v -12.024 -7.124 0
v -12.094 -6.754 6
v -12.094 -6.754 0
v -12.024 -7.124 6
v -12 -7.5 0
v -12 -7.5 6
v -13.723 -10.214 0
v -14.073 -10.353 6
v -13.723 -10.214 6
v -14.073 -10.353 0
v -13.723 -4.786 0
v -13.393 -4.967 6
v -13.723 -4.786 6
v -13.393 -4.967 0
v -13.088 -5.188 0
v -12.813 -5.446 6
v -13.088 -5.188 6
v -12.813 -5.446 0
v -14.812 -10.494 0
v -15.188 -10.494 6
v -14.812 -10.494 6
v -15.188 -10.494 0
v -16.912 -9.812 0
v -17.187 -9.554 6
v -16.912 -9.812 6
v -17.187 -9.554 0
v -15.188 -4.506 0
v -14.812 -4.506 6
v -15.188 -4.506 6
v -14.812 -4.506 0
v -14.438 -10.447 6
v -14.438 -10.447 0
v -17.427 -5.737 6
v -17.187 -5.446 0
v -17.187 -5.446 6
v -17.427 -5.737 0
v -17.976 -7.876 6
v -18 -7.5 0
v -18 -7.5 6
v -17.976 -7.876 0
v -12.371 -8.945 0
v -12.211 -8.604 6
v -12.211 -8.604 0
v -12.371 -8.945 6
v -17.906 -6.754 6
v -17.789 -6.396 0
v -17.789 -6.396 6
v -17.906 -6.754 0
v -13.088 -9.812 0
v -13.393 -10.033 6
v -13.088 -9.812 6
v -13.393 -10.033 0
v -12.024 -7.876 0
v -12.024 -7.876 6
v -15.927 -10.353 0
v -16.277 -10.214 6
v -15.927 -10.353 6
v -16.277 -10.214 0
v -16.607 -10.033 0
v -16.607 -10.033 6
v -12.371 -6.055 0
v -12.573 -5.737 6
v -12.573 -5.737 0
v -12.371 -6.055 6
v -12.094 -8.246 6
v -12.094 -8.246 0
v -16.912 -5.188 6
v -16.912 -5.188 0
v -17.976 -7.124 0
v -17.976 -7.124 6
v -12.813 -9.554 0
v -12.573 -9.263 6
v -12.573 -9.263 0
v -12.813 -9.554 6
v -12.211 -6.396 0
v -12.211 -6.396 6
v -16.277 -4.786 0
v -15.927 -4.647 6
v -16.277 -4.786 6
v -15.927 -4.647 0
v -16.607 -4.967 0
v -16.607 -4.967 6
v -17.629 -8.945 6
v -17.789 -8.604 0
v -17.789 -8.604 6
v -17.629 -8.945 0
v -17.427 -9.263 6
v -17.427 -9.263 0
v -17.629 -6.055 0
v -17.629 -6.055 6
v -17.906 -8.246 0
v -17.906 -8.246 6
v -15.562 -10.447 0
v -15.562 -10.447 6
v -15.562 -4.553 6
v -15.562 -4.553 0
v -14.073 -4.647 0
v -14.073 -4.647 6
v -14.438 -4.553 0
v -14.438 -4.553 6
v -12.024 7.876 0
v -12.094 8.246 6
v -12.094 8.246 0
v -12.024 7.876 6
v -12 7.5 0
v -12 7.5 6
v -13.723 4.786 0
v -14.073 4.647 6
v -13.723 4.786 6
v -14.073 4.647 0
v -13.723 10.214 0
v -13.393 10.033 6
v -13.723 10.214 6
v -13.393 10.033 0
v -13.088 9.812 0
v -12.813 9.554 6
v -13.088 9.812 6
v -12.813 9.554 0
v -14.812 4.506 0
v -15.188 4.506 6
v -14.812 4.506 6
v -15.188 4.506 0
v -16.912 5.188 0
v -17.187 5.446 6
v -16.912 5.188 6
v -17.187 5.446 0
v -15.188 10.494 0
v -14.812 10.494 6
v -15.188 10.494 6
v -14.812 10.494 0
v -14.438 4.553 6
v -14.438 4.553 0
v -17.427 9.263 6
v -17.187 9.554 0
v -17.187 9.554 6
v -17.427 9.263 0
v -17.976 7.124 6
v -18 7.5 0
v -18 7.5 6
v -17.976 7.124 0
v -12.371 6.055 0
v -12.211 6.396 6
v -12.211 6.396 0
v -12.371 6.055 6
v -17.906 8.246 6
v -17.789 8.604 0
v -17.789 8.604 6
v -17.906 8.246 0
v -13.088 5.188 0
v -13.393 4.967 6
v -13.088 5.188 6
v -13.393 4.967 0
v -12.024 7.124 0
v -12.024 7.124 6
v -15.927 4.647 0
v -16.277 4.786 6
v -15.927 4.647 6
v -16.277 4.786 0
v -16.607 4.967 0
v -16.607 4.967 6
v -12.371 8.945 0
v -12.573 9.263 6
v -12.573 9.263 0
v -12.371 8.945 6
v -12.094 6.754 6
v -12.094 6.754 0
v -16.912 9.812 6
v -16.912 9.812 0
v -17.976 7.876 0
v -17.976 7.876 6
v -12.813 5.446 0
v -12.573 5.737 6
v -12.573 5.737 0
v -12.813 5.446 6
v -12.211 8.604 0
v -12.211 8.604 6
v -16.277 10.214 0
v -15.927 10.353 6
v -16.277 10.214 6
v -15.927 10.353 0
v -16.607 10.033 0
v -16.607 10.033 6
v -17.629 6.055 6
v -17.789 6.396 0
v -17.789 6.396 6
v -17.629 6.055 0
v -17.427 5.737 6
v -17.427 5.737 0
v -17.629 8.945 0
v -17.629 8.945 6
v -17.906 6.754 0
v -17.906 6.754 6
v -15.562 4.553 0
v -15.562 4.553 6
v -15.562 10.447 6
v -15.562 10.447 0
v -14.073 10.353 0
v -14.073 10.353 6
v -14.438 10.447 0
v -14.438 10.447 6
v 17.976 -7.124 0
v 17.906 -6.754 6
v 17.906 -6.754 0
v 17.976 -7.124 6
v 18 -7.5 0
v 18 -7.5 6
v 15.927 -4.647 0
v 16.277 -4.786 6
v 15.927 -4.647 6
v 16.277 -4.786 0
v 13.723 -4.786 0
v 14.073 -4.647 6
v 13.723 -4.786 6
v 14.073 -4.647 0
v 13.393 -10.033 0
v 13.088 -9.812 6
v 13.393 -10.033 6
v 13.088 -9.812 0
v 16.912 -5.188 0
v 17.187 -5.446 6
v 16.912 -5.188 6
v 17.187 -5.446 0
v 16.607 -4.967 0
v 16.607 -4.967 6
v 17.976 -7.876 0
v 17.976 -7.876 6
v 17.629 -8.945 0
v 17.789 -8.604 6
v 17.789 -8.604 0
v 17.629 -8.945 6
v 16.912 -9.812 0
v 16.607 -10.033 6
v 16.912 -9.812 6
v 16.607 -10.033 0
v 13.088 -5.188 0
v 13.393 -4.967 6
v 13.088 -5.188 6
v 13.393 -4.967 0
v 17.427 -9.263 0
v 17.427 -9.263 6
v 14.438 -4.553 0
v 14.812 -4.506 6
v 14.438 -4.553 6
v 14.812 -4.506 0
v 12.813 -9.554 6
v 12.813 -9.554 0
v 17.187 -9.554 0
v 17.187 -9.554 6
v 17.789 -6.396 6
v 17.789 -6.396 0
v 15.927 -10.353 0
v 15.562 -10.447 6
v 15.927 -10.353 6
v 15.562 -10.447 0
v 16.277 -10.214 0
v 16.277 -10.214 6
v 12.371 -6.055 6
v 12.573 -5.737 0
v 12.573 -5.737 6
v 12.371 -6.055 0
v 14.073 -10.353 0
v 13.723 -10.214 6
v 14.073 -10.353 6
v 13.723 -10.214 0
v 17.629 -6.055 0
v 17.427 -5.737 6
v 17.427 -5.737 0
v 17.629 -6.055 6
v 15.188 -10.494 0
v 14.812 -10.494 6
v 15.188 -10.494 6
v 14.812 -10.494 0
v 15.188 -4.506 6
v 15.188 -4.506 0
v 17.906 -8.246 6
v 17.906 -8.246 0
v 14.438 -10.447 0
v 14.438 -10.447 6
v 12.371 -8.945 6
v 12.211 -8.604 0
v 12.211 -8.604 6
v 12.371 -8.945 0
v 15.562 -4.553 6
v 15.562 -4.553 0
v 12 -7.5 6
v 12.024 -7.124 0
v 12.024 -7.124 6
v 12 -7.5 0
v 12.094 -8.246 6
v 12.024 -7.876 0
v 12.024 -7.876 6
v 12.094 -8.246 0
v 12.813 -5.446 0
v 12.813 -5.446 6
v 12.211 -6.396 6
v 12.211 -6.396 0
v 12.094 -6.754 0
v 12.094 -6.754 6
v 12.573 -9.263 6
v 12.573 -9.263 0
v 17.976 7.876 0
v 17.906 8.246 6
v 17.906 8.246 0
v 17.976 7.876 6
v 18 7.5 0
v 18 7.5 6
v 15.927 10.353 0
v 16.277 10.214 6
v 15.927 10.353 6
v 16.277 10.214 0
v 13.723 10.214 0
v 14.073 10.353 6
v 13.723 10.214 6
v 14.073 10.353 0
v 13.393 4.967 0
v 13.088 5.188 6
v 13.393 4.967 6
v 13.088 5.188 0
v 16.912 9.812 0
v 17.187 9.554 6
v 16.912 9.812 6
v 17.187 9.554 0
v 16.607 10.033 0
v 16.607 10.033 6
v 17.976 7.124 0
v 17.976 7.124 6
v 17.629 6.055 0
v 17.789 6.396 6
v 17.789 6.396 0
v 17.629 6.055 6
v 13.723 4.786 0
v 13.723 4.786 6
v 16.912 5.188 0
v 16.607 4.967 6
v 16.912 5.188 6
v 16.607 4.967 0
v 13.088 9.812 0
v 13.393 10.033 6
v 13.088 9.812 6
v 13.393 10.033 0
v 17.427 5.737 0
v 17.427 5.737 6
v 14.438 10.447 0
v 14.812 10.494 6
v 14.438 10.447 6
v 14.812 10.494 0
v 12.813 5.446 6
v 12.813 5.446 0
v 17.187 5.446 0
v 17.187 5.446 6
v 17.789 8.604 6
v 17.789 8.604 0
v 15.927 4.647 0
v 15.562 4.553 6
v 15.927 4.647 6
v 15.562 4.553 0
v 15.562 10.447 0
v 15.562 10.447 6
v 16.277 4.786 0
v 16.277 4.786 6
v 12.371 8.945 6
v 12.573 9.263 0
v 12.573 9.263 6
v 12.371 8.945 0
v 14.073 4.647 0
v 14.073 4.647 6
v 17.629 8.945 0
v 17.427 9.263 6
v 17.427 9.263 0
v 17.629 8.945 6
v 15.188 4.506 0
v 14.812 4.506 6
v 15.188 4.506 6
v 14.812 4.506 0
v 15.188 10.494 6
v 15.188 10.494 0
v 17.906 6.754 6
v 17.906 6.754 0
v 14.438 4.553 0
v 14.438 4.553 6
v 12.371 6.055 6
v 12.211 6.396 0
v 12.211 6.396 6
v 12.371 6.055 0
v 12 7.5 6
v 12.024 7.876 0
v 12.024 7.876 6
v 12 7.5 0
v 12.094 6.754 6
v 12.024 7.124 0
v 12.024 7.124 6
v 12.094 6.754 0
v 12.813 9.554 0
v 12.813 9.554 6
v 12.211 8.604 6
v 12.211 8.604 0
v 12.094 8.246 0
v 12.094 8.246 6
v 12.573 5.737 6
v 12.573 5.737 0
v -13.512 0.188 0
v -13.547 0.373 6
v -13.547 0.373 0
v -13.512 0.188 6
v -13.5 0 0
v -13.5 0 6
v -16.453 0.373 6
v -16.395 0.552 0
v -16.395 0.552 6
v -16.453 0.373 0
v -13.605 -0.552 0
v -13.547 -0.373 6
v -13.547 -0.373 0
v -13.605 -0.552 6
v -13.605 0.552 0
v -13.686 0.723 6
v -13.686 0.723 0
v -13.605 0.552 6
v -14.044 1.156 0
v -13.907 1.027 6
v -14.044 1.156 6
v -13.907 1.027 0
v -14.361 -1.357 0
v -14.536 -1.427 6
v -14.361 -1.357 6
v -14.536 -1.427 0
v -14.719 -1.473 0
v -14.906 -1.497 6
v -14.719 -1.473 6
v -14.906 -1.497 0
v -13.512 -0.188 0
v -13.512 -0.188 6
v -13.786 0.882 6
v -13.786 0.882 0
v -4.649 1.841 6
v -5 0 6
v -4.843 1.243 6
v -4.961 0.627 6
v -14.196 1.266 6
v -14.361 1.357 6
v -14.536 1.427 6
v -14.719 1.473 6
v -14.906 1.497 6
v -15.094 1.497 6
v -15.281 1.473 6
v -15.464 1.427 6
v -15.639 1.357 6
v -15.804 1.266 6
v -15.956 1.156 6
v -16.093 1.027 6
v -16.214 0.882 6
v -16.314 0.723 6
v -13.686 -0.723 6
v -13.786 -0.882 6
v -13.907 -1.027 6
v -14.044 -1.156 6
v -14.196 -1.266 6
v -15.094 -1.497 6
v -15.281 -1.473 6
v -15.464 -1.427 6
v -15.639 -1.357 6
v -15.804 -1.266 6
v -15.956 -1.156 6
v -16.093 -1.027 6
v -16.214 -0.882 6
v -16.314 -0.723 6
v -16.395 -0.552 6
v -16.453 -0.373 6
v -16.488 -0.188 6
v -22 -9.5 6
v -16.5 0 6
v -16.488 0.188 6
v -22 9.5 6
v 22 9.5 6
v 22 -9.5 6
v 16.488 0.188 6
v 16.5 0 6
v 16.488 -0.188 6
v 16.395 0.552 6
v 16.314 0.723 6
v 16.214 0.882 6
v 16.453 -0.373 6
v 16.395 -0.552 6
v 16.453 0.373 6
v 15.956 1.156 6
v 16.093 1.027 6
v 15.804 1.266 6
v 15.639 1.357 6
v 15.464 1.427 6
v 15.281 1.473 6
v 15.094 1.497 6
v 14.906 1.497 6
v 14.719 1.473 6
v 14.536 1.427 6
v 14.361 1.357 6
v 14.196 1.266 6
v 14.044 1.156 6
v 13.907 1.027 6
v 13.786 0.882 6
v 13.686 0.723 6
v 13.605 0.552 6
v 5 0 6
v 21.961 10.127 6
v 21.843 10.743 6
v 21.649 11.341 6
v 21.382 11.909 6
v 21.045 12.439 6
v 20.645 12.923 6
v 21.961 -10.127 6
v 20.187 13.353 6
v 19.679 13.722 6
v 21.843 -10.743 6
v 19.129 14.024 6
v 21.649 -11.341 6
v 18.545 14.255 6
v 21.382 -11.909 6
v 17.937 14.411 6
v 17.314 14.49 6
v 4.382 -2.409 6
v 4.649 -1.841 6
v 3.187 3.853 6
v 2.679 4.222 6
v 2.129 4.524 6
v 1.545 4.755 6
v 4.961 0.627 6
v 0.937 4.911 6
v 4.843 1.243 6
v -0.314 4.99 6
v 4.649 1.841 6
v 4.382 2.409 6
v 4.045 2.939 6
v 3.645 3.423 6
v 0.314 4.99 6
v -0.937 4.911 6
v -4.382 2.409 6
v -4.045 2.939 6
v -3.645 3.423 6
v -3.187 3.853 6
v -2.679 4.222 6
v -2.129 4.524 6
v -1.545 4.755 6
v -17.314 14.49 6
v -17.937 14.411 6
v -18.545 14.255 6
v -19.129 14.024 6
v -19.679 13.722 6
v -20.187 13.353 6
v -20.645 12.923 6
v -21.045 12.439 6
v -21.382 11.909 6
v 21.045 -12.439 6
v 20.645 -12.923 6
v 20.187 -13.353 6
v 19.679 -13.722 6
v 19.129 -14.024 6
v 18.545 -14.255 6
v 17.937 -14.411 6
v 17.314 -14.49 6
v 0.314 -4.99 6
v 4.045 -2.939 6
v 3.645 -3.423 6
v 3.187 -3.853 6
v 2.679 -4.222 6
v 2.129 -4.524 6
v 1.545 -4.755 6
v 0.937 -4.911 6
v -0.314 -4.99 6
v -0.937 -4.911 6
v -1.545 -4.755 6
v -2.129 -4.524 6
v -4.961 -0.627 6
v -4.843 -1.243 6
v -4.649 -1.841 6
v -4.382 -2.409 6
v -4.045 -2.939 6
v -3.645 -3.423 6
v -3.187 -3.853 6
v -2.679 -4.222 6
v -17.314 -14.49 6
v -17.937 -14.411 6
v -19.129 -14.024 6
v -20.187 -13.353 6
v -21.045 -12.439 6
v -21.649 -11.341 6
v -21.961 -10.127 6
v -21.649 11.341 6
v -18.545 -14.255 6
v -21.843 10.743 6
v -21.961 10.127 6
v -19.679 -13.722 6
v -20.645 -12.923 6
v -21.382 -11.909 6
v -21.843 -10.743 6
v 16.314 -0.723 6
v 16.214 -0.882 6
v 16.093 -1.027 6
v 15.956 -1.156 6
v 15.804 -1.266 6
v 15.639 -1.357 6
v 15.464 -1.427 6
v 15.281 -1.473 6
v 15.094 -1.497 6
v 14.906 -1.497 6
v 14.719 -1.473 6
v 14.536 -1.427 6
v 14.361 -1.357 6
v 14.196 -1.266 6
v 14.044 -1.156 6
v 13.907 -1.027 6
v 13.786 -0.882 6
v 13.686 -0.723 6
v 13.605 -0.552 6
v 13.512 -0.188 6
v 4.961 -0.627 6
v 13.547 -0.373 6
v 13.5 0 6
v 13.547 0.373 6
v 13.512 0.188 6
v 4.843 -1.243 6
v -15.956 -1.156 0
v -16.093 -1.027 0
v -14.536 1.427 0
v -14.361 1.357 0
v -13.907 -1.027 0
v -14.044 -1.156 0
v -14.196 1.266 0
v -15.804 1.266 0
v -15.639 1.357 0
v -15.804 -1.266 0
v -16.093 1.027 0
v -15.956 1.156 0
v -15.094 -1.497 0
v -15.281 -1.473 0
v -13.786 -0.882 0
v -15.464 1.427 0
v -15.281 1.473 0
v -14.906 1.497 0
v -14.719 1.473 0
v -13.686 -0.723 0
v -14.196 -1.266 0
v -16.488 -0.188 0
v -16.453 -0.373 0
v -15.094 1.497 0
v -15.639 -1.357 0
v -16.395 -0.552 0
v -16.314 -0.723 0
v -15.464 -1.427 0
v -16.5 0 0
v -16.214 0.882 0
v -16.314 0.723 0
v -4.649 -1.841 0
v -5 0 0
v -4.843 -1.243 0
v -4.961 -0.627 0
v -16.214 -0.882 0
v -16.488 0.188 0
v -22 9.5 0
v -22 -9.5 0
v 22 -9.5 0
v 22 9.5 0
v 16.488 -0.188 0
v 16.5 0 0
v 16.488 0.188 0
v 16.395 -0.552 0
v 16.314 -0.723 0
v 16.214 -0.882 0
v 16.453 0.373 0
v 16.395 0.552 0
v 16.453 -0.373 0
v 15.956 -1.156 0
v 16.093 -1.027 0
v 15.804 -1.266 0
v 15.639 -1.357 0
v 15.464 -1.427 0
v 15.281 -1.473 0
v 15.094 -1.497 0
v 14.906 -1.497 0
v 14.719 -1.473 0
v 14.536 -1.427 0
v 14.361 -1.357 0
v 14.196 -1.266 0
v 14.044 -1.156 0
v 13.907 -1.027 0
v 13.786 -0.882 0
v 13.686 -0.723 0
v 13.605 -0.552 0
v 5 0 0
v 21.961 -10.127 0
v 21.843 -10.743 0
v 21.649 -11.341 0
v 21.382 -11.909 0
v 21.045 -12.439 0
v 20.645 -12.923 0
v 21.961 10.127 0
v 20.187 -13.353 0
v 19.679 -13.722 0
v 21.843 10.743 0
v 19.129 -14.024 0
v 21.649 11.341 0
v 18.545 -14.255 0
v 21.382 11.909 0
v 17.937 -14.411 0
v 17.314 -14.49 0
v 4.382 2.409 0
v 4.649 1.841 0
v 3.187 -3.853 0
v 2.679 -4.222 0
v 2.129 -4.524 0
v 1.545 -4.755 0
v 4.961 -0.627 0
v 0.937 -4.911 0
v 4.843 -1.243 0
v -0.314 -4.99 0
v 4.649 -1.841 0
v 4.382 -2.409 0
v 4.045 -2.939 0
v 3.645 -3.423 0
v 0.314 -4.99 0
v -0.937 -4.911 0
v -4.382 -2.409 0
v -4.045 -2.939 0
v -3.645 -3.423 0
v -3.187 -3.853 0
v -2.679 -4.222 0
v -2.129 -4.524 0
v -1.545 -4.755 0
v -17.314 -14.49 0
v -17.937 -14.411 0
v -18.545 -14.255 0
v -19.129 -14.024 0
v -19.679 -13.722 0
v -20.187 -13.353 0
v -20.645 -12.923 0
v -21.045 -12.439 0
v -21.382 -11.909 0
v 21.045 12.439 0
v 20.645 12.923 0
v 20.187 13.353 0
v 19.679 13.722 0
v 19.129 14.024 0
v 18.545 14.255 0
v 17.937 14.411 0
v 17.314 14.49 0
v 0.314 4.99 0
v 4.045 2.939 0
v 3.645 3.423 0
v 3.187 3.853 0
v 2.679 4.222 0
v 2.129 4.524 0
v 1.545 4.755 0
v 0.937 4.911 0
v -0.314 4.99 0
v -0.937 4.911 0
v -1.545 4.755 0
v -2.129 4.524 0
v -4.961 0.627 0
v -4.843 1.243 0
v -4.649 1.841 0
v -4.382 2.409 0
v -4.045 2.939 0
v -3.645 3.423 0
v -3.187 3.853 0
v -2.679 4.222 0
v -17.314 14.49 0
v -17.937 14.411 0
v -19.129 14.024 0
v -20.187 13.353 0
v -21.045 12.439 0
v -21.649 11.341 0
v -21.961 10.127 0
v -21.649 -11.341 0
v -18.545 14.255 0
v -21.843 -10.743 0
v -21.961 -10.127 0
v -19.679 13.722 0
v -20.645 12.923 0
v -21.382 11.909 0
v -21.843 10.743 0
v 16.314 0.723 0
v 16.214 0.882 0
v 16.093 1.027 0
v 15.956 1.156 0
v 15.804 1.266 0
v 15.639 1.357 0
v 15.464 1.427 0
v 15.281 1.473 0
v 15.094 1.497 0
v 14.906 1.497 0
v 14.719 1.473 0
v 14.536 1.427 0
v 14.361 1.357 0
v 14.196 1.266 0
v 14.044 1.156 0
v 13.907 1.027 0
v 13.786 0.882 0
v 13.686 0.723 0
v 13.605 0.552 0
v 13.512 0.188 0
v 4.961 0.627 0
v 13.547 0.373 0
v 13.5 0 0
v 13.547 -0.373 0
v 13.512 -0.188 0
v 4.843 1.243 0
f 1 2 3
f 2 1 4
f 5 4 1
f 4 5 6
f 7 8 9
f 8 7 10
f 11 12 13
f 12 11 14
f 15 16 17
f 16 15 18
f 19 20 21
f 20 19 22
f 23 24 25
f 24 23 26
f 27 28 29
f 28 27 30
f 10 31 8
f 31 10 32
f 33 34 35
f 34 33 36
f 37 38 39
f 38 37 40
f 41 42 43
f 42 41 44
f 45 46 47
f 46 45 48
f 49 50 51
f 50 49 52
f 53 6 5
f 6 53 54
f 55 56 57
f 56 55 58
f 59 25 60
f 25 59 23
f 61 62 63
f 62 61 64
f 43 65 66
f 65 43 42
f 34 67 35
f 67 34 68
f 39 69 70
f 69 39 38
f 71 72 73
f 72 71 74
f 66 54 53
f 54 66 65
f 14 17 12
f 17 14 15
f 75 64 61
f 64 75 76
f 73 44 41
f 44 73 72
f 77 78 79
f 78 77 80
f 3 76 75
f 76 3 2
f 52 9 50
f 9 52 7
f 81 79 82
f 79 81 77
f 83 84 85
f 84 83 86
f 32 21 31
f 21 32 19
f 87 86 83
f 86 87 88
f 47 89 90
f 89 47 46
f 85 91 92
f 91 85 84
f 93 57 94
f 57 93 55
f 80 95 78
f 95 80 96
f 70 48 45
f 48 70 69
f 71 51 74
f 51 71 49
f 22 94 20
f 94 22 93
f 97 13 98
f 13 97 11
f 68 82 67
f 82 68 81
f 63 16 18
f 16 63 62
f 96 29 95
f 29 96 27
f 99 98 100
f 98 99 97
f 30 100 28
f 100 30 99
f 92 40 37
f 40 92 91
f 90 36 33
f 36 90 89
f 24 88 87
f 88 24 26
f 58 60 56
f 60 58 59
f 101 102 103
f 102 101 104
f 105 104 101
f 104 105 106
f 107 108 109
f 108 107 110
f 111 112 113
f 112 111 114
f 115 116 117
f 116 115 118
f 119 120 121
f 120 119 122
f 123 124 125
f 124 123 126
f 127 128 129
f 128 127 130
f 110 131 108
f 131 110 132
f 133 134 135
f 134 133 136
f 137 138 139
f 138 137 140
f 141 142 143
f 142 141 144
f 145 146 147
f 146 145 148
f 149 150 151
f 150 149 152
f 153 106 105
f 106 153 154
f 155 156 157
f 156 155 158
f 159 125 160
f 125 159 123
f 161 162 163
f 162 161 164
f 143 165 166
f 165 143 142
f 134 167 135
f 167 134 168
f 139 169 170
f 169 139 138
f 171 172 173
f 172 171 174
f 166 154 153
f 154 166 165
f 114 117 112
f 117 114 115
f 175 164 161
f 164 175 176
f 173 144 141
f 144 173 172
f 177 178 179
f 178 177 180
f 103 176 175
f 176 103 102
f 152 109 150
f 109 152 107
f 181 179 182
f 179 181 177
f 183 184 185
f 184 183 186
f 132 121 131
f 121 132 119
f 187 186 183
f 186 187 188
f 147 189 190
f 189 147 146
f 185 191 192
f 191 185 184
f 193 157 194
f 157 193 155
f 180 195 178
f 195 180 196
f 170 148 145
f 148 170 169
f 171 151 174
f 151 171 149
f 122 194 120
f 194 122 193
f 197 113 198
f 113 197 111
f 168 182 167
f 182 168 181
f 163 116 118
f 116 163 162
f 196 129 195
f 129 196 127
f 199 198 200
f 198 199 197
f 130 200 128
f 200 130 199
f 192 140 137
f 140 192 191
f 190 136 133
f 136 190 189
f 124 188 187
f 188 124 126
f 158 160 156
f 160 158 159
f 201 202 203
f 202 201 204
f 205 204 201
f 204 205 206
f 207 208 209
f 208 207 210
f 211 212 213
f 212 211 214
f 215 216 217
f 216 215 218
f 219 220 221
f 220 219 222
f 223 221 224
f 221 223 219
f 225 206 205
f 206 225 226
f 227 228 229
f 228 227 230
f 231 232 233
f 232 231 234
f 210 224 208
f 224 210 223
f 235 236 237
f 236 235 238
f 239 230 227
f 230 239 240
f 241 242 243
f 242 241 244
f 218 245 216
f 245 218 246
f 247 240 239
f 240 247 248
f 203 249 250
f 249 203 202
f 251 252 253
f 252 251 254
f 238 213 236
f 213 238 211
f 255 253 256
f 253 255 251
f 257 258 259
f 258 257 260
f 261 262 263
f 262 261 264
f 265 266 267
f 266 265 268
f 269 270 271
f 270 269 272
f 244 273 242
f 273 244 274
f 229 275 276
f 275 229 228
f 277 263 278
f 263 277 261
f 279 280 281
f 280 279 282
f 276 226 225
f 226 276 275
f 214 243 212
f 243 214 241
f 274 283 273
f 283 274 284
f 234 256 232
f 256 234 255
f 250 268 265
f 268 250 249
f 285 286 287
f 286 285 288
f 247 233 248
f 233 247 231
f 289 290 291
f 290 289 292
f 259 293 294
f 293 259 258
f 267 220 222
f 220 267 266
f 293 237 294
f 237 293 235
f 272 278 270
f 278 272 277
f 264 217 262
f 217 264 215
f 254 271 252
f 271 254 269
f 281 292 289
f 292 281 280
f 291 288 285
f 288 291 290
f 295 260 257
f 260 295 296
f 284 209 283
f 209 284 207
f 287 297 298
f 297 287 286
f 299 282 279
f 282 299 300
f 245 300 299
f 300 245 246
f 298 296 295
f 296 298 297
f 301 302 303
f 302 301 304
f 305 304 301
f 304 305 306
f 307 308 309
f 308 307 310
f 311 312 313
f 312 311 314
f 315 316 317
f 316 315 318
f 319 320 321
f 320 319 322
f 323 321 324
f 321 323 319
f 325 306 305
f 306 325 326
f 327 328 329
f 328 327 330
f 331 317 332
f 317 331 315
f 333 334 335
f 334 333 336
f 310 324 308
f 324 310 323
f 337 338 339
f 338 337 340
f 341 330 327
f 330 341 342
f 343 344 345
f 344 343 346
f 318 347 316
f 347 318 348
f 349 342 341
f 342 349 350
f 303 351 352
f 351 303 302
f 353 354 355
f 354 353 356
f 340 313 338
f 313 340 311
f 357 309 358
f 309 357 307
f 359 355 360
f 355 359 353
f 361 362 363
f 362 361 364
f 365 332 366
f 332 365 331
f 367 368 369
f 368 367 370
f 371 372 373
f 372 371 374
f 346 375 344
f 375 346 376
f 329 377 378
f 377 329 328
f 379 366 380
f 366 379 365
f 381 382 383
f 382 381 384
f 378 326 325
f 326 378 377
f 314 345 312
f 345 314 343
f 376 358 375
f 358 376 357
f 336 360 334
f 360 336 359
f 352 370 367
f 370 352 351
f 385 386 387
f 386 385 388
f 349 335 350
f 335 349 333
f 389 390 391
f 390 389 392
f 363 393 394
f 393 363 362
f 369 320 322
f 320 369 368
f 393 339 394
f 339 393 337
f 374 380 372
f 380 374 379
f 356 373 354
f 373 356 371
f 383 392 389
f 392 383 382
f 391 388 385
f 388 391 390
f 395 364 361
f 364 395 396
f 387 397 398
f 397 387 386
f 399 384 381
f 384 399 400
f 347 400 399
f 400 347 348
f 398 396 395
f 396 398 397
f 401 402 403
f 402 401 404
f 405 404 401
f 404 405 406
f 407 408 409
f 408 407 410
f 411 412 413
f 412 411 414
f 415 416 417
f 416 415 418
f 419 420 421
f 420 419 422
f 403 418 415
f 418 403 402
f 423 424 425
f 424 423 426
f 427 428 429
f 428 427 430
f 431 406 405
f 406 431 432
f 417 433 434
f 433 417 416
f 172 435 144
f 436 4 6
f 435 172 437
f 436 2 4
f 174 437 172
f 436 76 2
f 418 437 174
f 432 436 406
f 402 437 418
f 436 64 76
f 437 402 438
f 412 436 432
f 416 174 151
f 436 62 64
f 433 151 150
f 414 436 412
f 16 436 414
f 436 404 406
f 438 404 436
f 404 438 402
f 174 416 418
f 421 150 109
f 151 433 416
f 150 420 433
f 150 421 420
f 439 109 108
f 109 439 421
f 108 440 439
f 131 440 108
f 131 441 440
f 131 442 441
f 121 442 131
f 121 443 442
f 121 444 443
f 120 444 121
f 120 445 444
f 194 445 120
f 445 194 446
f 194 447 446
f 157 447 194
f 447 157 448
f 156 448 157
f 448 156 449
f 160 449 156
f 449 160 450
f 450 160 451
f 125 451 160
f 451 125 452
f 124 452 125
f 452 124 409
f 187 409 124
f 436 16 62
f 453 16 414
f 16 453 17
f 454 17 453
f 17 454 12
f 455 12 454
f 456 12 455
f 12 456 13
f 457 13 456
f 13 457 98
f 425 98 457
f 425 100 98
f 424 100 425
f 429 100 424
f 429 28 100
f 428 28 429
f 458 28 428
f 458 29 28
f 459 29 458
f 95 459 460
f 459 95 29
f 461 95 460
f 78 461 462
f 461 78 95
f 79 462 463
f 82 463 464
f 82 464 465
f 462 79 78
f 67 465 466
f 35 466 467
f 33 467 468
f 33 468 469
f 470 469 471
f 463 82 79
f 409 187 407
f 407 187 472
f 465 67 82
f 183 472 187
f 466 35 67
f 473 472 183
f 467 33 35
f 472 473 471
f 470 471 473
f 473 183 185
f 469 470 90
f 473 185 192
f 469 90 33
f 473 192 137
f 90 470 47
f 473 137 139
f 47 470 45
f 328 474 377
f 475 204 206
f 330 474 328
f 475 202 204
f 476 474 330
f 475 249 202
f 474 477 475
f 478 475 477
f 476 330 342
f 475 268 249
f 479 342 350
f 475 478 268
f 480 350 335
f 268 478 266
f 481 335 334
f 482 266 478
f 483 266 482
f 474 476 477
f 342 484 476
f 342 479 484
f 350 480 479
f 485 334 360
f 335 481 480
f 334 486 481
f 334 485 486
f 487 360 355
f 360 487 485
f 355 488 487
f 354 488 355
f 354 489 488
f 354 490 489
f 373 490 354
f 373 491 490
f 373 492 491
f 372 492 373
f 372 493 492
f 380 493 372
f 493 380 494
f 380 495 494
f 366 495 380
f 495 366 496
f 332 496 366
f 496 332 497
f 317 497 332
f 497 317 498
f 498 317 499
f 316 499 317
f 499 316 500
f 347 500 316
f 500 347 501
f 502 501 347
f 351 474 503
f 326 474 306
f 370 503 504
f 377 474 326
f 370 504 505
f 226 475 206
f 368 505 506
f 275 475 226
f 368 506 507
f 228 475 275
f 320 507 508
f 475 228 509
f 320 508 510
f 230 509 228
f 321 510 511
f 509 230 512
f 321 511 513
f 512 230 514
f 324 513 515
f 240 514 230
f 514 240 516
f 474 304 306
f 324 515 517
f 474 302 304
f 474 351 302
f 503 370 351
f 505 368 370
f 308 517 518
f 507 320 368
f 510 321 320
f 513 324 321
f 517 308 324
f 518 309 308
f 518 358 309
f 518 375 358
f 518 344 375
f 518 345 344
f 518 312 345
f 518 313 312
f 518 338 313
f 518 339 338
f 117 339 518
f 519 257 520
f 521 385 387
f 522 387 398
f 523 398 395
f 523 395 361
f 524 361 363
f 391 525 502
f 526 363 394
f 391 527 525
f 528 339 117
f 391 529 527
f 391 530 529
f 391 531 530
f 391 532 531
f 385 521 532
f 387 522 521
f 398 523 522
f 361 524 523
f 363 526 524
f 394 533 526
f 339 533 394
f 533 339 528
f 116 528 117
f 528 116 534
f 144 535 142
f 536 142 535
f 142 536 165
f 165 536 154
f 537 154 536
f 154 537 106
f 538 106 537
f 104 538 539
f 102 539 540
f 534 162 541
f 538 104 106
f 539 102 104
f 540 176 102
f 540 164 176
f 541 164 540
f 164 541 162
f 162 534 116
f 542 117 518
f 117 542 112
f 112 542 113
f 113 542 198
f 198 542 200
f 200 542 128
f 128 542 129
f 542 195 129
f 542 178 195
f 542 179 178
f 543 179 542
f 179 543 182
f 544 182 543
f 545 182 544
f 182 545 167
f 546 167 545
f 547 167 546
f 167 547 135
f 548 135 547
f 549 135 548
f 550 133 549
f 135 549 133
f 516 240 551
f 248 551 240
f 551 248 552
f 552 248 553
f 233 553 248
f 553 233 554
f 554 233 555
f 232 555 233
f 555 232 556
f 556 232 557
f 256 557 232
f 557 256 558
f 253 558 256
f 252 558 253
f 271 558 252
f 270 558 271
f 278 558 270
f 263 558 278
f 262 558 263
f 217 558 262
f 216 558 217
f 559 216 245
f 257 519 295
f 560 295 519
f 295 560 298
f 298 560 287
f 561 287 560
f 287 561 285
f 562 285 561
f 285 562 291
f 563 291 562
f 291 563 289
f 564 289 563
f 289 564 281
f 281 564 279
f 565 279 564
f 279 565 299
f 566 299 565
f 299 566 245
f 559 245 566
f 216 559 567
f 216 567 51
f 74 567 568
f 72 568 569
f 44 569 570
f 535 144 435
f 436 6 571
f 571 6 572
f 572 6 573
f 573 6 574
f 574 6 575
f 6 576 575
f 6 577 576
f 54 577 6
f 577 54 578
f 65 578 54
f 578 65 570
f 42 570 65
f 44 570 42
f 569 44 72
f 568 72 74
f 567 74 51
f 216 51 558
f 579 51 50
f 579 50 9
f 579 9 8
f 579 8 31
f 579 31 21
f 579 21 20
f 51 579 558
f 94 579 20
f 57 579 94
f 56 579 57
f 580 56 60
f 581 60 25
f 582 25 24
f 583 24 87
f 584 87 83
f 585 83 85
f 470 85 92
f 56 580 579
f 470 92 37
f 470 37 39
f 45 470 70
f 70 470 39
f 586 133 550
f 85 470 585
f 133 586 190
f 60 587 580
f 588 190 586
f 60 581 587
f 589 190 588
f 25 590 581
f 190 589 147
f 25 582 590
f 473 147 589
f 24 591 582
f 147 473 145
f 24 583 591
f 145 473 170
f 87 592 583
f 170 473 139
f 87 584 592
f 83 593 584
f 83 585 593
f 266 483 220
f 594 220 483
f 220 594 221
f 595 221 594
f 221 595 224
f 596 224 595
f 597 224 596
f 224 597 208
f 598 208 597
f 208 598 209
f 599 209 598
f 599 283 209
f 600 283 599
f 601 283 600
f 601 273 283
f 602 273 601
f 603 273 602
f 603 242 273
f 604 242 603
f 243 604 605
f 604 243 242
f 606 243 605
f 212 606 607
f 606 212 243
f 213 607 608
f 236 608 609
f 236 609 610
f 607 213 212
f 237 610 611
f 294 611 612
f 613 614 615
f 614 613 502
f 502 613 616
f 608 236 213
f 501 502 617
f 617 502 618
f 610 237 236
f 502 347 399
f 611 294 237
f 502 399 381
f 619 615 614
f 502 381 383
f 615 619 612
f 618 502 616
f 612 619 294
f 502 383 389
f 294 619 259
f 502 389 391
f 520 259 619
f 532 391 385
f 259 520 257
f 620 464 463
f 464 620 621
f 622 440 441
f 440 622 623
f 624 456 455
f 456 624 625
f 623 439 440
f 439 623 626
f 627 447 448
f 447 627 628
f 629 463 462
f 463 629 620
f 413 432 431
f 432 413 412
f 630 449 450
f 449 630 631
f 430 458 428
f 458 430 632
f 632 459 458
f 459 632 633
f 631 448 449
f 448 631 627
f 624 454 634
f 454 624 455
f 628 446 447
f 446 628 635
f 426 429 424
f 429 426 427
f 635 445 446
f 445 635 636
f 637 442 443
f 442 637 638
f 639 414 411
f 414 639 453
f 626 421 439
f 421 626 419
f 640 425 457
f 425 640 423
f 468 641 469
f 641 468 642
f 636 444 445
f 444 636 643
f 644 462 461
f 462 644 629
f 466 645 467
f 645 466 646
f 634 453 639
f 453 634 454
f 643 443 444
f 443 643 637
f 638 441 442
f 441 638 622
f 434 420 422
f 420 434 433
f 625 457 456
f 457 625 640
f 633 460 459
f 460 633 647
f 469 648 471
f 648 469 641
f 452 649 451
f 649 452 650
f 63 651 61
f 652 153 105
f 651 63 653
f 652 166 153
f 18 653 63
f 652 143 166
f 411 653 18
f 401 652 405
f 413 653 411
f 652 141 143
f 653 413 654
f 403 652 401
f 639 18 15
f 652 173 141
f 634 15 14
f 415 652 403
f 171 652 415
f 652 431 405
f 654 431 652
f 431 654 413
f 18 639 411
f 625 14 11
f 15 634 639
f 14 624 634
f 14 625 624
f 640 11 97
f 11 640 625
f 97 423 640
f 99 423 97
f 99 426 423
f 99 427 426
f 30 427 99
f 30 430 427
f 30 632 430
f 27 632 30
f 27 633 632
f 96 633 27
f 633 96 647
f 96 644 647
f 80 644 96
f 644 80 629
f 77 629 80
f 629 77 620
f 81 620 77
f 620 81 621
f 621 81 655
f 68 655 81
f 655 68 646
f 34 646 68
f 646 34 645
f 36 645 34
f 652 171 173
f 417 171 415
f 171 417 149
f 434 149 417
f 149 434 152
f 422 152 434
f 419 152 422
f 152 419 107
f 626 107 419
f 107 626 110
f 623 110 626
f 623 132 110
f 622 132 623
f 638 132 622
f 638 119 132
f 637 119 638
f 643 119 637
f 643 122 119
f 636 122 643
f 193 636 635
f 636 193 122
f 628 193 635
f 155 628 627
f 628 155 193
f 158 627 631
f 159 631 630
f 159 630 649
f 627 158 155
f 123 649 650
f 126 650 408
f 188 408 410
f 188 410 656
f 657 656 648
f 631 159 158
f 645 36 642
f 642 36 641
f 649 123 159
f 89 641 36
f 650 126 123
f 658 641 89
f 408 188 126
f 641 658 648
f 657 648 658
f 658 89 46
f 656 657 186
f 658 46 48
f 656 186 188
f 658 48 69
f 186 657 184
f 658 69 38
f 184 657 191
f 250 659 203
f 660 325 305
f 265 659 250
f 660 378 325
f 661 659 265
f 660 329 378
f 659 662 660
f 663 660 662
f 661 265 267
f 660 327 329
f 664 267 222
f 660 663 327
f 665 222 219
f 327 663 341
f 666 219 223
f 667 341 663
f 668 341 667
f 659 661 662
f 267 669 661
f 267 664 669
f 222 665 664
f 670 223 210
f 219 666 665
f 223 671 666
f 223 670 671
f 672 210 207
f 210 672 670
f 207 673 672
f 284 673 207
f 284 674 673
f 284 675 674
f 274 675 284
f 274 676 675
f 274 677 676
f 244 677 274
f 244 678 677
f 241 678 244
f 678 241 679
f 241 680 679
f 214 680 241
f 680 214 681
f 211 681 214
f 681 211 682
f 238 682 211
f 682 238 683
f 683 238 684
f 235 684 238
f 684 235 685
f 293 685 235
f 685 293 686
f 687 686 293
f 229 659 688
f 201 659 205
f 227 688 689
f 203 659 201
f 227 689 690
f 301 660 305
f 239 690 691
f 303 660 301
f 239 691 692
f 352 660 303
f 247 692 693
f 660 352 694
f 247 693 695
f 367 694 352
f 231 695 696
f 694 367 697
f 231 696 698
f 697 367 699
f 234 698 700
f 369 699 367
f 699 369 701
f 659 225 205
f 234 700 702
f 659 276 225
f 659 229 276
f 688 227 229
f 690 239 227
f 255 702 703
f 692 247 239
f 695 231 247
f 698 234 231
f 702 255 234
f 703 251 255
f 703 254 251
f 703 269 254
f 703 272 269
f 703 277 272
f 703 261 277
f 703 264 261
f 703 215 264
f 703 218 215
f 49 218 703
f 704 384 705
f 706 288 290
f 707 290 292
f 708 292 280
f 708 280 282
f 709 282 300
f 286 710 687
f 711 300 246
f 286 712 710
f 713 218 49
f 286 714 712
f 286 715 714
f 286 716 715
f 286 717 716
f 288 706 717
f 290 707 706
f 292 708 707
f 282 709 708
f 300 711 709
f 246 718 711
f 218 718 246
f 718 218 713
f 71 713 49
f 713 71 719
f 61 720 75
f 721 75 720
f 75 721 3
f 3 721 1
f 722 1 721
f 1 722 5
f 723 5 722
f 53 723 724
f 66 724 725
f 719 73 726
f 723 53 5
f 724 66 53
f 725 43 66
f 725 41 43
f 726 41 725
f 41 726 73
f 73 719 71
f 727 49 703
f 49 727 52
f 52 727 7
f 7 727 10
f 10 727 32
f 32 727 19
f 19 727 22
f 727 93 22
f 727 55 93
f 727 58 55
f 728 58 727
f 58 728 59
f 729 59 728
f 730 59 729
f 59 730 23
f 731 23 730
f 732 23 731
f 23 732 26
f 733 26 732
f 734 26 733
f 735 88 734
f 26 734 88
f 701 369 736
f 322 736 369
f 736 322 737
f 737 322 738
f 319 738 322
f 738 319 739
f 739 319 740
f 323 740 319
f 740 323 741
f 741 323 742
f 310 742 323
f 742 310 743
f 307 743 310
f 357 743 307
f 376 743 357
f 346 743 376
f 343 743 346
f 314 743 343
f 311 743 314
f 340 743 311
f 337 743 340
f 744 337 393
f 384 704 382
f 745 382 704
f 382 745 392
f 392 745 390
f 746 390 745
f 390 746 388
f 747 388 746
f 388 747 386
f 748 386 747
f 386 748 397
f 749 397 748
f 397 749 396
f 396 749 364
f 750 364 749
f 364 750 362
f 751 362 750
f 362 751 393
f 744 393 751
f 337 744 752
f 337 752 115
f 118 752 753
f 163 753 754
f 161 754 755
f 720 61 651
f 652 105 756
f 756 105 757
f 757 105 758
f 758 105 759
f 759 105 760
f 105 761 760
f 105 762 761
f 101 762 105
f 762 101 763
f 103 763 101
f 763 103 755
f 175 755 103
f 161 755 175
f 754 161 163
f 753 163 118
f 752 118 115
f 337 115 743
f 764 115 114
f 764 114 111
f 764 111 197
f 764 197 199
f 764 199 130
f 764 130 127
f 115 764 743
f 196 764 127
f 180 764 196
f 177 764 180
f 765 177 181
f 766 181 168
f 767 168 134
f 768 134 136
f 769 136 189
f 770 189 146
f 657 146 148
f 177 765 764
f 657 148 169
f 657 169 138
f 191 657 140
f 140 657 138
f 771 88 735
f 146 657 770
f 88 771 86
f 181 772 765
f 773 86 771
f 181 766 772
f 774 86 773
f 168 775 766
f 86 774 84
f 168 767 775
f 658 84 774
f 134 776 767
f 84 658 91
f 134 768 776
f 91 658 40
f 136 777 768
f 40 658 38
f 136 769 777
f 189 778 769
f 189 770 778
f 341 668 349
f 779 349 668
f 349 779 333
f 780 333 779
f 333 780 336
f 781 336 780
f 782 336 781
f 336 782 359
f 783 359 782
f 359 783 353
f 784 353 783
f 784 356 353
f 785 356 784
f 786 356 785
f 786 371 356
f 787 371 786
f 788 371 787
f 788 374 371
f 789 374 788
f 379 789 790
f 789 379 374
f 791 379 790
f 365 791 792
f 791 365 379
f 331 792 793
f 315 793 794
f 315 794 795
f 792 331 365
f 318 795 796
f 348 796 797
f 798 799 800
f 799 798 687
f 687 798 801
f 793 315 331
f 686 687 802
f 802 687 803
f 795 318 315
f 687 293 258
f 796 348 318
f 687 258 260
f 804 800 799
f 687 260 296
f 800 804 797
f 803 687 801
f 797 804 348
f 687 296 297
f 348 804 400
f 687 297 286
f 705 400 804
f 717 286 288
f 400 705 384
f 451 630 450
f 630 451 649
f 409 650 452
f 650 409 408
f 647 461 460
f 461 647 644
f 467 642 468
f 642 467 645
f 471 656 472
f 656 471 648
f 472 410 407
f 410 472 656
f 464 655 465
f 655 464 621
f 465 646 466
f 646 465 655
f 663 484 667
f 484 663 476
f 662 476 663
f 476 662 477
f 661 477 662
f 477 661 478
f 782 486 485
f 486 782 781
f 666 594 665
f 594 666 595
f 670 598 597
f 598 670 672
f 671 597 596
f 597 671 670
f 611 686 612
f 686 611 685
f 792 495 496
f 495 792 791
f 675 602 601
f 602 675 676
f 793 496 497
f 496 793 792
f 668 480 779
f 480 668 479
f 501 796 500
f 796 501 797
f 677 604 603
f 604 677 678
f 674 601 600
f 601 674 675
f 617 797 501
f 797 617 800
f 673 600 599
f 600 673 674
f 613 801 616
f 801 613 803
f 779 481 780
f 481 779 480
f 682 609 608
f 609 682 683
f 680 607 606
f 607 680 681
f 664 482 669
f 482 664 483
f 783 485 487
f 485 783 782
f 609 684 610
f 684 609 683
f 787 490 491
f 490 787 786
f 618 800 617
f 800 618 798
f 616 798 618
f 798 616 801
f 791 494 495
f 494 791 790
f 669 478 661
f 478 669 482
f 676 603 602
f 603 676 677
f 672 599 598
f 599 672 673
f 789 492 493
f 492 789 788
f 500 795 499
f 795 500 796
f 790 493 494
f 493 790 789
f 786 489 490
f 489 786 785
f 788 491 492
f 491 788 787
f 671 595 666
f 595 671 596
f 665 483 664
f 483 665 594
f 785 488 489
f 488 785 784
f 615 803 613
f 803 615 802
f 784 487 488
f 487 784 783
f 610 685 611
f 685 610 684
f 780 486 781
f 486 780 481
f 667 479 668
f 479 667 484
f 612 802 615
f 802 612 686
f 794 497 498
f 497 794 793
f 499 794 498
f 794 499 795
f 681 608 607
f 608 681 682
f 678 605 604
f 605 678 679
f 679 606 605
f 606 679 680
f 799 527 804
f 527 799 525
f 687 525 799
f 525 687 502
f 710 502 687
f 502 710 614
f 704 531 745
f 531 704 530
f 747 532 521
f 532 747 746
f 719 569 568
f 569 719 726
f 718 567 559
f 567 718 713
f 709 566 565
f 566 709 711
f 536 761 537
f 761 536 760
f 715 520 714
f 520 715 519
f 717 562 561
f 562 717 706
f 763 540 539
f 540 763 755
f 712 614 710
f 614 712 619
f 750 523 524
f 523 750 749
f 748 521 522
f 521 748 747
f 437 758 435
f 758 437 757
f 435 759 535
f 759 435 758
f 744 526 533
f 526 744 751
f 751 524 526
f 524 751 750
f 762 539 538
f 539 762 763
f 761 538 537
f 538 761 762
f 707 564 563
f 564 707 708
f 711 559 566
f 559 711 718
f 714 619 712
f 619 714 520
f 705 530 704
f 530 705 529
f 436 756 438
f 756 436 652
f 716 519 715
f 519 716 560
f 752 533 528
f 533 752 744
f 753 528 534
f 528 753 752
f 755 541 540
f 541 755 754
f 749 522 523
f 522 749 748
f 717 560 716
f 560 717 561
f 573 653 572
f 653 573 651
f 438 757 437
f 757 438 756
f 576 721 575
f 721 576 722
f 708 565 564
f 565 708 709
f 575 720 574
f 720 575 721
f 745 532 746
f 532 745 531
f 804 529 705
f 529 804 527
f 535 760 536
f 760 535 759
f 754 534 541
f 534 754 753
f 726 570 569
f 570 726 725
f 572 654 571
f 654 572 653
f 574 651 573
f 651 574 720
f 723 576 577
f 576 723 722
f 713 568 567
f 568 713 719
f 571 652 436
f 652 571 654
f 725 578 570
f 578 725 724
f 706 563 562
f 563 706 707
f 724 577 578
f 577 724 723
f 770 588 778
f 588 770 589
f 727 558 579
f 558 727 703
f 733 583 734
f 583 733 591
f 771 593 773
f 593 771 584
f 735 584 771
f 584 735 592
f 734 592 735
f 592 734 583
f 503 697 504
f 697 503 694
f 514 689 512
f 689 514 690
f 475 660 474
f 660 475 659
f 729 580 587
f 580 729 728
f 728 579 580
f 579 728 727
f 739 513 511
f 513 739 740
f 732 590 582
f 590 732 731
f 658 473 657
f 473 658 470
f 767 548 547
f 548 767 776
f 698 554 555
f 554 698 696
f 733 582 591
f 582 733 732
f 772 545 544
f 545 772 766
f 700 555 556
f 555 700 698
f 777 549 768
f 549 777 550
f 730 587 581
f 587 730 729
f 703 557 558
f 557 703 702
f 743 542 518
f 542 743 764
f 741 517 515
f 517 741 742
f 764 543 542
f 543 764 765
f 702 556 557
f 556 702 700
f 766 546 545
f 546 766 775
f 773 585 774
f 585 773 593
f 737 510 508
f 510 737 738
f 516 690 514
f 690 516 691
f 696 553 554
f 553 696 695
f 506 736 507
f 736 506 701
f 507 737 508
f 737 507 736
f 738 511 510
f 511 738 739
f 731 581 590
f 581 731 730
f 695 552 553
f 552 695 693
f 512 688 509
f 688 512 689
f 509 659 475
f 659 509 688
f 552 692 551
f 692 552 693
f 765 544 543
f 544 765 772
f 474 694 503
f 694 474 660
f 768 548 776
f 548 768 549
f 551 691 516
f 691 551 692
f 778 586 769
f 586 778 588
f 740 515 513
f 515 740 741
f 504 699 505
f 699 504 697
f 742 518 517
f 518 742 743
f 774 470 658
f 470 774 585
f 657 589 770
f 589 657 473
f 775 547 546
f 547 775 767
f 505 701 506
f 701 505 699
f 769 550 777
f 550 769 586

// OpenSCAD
$fn = 50;


difference() {
	union() {
		hull() {
			translate(v = [-17.0000000000, 9.5000000000, 0]) {
				cylinder(h = 6, r = 5);
			}
			translate(v = [17.0000000000, 9.5000000000, 0]) {
				cylinder(h = 6, r = 5);
			}
			translate(v = [-17.0000000000, -9.5000000000, 0]) {
				cylinder(h = 6, r = 5);
			}
			translate(v = [17.0000000000, -9.5000000000, 0]) {
				cylinder(h = 6, r = 5);
			}
		}
	}
	union() {
		#translate(v = [-15.0000000000, -7.5000000000, 0]) {
			cylinder(h = 6, r = 3.0000000000);
		}
		#translate(v = [-15.0000000000, 7.5000000000, 0]) {
			cylinder(h = 6, r = 3.0000000000);
		}
		#translate(v = [15.0000000000, -7.5000000000, 0]) {
			cylinder(h = 6, r = 3.0000000000);
		}
		#translate(v = [15.0000000000, 7.5000000000, 0]) {
			cylinder(h = 6, r = 3.0000000000);
		}
		#translate(v = [-15.0000000000, -7.5000000000, -100.0000000000]) {
			cylinder(h = 200, r = 3.0000000000);
		}
		#translate(v = [-15.0000000000, 7.5000000000, -100.0000000000]) {
			cylinder(h = 200, r = 3.0000000000);
		}
		#translate(v = [15.0000000000, -7.5000000000, -100.0000000000]) {
			cylinder(h = 200, r = 3.0000000000);
		}
		#translate(v = [15.0000000000, 7.5000000000, -100.0000000000]) {
			cylinder(h = 200, r = 3.0000000000);
		}
		#translate(v = [-15.0000000000, -7.5000000000, 0]) {
			cylinder(h = 6, r = 1.5000000000);
		}
		#translate(v = [-15.0000000000, 0.0000000000, 0]) {
			cylinder(h = 6, r = 1.5000000000);
		}
		#translate(v = [-15.0000000000, 7.5000000000, 0]) {
			cylinder(h = 6, r = 1.5000000000);
		}
		#translate(v = [15.0000000000, -7.5000000000, 0]) {
			cylinder(h = 6, r = 1.5000000000);
		}
		#translate(v = [15.0000000000, 0.0000000000, 0]) {
			cylinder(h = 6, r = 1.5000000000);
		}
		#translate(v = [15.0000000000, 7.5000000000, 0]) {
			cylinder(h = 6, r = 1.5000000000);
		}
		#translate(v = [-15.0000000000, -7.5000000000, 0]) {
			cylinder(h = 6, r = 1.5000000000);
		}
		#translate(v = [-15.0000000000, 0.0000000000, 0]) {
			cylinder(h = 6, r = 1.5000000000);
		}
		#translate(v = [-15.0000000000, 7.5000000000, 0]) {
			cylinder(h = 6, r = 1.5000000000);
		}
		#translate(v = [15.0000000000, -7.5000000000, 0]) {
			cylinder(h = 6, r = 1.5000000000);
		}
		#translate(v = [15.0000000000, 0.0000000000, 0]) {
			cylinder(h = 6, r = 1.5000000000);
		}
		#translate(v = [15.0000000000, 7.5000000000, 0]) {
			cylinder(h = 6, r = 1.5000000000);
		}
		#translate(v = [-15.0000000000, -7.5000000000, 0]) {
			cylinder(h = 6, r = 1.5000000000);
		}
		#translate(v = [-15.0000000000, 0.0000000000, 0]) {
			cylinder(h = 6, r = 1.5000000000);
		}
		#translate(v = [-15.0000000000, 7.5000000000, 0]) {
			cylinder(h = 6, r = 1.5000000000);
		}
		#translate(v = [15.0000000000, -7.5000000000, 0]) {
			cylinder(h = 6, r = 1.5000000000);
		}
		#translate(v = [15.0000000000, 0.0000000000, 0]) {
			cylinder(h = 6, r = 1.5000000000);
		}
		#translate(v = [15.0000000000, 7.5000000000, 0]) {
			cylinder(h = 6, r = 1.5000000000);
		}
		#cylinder(h = 6, r = 5.0000000000);
	}
}
